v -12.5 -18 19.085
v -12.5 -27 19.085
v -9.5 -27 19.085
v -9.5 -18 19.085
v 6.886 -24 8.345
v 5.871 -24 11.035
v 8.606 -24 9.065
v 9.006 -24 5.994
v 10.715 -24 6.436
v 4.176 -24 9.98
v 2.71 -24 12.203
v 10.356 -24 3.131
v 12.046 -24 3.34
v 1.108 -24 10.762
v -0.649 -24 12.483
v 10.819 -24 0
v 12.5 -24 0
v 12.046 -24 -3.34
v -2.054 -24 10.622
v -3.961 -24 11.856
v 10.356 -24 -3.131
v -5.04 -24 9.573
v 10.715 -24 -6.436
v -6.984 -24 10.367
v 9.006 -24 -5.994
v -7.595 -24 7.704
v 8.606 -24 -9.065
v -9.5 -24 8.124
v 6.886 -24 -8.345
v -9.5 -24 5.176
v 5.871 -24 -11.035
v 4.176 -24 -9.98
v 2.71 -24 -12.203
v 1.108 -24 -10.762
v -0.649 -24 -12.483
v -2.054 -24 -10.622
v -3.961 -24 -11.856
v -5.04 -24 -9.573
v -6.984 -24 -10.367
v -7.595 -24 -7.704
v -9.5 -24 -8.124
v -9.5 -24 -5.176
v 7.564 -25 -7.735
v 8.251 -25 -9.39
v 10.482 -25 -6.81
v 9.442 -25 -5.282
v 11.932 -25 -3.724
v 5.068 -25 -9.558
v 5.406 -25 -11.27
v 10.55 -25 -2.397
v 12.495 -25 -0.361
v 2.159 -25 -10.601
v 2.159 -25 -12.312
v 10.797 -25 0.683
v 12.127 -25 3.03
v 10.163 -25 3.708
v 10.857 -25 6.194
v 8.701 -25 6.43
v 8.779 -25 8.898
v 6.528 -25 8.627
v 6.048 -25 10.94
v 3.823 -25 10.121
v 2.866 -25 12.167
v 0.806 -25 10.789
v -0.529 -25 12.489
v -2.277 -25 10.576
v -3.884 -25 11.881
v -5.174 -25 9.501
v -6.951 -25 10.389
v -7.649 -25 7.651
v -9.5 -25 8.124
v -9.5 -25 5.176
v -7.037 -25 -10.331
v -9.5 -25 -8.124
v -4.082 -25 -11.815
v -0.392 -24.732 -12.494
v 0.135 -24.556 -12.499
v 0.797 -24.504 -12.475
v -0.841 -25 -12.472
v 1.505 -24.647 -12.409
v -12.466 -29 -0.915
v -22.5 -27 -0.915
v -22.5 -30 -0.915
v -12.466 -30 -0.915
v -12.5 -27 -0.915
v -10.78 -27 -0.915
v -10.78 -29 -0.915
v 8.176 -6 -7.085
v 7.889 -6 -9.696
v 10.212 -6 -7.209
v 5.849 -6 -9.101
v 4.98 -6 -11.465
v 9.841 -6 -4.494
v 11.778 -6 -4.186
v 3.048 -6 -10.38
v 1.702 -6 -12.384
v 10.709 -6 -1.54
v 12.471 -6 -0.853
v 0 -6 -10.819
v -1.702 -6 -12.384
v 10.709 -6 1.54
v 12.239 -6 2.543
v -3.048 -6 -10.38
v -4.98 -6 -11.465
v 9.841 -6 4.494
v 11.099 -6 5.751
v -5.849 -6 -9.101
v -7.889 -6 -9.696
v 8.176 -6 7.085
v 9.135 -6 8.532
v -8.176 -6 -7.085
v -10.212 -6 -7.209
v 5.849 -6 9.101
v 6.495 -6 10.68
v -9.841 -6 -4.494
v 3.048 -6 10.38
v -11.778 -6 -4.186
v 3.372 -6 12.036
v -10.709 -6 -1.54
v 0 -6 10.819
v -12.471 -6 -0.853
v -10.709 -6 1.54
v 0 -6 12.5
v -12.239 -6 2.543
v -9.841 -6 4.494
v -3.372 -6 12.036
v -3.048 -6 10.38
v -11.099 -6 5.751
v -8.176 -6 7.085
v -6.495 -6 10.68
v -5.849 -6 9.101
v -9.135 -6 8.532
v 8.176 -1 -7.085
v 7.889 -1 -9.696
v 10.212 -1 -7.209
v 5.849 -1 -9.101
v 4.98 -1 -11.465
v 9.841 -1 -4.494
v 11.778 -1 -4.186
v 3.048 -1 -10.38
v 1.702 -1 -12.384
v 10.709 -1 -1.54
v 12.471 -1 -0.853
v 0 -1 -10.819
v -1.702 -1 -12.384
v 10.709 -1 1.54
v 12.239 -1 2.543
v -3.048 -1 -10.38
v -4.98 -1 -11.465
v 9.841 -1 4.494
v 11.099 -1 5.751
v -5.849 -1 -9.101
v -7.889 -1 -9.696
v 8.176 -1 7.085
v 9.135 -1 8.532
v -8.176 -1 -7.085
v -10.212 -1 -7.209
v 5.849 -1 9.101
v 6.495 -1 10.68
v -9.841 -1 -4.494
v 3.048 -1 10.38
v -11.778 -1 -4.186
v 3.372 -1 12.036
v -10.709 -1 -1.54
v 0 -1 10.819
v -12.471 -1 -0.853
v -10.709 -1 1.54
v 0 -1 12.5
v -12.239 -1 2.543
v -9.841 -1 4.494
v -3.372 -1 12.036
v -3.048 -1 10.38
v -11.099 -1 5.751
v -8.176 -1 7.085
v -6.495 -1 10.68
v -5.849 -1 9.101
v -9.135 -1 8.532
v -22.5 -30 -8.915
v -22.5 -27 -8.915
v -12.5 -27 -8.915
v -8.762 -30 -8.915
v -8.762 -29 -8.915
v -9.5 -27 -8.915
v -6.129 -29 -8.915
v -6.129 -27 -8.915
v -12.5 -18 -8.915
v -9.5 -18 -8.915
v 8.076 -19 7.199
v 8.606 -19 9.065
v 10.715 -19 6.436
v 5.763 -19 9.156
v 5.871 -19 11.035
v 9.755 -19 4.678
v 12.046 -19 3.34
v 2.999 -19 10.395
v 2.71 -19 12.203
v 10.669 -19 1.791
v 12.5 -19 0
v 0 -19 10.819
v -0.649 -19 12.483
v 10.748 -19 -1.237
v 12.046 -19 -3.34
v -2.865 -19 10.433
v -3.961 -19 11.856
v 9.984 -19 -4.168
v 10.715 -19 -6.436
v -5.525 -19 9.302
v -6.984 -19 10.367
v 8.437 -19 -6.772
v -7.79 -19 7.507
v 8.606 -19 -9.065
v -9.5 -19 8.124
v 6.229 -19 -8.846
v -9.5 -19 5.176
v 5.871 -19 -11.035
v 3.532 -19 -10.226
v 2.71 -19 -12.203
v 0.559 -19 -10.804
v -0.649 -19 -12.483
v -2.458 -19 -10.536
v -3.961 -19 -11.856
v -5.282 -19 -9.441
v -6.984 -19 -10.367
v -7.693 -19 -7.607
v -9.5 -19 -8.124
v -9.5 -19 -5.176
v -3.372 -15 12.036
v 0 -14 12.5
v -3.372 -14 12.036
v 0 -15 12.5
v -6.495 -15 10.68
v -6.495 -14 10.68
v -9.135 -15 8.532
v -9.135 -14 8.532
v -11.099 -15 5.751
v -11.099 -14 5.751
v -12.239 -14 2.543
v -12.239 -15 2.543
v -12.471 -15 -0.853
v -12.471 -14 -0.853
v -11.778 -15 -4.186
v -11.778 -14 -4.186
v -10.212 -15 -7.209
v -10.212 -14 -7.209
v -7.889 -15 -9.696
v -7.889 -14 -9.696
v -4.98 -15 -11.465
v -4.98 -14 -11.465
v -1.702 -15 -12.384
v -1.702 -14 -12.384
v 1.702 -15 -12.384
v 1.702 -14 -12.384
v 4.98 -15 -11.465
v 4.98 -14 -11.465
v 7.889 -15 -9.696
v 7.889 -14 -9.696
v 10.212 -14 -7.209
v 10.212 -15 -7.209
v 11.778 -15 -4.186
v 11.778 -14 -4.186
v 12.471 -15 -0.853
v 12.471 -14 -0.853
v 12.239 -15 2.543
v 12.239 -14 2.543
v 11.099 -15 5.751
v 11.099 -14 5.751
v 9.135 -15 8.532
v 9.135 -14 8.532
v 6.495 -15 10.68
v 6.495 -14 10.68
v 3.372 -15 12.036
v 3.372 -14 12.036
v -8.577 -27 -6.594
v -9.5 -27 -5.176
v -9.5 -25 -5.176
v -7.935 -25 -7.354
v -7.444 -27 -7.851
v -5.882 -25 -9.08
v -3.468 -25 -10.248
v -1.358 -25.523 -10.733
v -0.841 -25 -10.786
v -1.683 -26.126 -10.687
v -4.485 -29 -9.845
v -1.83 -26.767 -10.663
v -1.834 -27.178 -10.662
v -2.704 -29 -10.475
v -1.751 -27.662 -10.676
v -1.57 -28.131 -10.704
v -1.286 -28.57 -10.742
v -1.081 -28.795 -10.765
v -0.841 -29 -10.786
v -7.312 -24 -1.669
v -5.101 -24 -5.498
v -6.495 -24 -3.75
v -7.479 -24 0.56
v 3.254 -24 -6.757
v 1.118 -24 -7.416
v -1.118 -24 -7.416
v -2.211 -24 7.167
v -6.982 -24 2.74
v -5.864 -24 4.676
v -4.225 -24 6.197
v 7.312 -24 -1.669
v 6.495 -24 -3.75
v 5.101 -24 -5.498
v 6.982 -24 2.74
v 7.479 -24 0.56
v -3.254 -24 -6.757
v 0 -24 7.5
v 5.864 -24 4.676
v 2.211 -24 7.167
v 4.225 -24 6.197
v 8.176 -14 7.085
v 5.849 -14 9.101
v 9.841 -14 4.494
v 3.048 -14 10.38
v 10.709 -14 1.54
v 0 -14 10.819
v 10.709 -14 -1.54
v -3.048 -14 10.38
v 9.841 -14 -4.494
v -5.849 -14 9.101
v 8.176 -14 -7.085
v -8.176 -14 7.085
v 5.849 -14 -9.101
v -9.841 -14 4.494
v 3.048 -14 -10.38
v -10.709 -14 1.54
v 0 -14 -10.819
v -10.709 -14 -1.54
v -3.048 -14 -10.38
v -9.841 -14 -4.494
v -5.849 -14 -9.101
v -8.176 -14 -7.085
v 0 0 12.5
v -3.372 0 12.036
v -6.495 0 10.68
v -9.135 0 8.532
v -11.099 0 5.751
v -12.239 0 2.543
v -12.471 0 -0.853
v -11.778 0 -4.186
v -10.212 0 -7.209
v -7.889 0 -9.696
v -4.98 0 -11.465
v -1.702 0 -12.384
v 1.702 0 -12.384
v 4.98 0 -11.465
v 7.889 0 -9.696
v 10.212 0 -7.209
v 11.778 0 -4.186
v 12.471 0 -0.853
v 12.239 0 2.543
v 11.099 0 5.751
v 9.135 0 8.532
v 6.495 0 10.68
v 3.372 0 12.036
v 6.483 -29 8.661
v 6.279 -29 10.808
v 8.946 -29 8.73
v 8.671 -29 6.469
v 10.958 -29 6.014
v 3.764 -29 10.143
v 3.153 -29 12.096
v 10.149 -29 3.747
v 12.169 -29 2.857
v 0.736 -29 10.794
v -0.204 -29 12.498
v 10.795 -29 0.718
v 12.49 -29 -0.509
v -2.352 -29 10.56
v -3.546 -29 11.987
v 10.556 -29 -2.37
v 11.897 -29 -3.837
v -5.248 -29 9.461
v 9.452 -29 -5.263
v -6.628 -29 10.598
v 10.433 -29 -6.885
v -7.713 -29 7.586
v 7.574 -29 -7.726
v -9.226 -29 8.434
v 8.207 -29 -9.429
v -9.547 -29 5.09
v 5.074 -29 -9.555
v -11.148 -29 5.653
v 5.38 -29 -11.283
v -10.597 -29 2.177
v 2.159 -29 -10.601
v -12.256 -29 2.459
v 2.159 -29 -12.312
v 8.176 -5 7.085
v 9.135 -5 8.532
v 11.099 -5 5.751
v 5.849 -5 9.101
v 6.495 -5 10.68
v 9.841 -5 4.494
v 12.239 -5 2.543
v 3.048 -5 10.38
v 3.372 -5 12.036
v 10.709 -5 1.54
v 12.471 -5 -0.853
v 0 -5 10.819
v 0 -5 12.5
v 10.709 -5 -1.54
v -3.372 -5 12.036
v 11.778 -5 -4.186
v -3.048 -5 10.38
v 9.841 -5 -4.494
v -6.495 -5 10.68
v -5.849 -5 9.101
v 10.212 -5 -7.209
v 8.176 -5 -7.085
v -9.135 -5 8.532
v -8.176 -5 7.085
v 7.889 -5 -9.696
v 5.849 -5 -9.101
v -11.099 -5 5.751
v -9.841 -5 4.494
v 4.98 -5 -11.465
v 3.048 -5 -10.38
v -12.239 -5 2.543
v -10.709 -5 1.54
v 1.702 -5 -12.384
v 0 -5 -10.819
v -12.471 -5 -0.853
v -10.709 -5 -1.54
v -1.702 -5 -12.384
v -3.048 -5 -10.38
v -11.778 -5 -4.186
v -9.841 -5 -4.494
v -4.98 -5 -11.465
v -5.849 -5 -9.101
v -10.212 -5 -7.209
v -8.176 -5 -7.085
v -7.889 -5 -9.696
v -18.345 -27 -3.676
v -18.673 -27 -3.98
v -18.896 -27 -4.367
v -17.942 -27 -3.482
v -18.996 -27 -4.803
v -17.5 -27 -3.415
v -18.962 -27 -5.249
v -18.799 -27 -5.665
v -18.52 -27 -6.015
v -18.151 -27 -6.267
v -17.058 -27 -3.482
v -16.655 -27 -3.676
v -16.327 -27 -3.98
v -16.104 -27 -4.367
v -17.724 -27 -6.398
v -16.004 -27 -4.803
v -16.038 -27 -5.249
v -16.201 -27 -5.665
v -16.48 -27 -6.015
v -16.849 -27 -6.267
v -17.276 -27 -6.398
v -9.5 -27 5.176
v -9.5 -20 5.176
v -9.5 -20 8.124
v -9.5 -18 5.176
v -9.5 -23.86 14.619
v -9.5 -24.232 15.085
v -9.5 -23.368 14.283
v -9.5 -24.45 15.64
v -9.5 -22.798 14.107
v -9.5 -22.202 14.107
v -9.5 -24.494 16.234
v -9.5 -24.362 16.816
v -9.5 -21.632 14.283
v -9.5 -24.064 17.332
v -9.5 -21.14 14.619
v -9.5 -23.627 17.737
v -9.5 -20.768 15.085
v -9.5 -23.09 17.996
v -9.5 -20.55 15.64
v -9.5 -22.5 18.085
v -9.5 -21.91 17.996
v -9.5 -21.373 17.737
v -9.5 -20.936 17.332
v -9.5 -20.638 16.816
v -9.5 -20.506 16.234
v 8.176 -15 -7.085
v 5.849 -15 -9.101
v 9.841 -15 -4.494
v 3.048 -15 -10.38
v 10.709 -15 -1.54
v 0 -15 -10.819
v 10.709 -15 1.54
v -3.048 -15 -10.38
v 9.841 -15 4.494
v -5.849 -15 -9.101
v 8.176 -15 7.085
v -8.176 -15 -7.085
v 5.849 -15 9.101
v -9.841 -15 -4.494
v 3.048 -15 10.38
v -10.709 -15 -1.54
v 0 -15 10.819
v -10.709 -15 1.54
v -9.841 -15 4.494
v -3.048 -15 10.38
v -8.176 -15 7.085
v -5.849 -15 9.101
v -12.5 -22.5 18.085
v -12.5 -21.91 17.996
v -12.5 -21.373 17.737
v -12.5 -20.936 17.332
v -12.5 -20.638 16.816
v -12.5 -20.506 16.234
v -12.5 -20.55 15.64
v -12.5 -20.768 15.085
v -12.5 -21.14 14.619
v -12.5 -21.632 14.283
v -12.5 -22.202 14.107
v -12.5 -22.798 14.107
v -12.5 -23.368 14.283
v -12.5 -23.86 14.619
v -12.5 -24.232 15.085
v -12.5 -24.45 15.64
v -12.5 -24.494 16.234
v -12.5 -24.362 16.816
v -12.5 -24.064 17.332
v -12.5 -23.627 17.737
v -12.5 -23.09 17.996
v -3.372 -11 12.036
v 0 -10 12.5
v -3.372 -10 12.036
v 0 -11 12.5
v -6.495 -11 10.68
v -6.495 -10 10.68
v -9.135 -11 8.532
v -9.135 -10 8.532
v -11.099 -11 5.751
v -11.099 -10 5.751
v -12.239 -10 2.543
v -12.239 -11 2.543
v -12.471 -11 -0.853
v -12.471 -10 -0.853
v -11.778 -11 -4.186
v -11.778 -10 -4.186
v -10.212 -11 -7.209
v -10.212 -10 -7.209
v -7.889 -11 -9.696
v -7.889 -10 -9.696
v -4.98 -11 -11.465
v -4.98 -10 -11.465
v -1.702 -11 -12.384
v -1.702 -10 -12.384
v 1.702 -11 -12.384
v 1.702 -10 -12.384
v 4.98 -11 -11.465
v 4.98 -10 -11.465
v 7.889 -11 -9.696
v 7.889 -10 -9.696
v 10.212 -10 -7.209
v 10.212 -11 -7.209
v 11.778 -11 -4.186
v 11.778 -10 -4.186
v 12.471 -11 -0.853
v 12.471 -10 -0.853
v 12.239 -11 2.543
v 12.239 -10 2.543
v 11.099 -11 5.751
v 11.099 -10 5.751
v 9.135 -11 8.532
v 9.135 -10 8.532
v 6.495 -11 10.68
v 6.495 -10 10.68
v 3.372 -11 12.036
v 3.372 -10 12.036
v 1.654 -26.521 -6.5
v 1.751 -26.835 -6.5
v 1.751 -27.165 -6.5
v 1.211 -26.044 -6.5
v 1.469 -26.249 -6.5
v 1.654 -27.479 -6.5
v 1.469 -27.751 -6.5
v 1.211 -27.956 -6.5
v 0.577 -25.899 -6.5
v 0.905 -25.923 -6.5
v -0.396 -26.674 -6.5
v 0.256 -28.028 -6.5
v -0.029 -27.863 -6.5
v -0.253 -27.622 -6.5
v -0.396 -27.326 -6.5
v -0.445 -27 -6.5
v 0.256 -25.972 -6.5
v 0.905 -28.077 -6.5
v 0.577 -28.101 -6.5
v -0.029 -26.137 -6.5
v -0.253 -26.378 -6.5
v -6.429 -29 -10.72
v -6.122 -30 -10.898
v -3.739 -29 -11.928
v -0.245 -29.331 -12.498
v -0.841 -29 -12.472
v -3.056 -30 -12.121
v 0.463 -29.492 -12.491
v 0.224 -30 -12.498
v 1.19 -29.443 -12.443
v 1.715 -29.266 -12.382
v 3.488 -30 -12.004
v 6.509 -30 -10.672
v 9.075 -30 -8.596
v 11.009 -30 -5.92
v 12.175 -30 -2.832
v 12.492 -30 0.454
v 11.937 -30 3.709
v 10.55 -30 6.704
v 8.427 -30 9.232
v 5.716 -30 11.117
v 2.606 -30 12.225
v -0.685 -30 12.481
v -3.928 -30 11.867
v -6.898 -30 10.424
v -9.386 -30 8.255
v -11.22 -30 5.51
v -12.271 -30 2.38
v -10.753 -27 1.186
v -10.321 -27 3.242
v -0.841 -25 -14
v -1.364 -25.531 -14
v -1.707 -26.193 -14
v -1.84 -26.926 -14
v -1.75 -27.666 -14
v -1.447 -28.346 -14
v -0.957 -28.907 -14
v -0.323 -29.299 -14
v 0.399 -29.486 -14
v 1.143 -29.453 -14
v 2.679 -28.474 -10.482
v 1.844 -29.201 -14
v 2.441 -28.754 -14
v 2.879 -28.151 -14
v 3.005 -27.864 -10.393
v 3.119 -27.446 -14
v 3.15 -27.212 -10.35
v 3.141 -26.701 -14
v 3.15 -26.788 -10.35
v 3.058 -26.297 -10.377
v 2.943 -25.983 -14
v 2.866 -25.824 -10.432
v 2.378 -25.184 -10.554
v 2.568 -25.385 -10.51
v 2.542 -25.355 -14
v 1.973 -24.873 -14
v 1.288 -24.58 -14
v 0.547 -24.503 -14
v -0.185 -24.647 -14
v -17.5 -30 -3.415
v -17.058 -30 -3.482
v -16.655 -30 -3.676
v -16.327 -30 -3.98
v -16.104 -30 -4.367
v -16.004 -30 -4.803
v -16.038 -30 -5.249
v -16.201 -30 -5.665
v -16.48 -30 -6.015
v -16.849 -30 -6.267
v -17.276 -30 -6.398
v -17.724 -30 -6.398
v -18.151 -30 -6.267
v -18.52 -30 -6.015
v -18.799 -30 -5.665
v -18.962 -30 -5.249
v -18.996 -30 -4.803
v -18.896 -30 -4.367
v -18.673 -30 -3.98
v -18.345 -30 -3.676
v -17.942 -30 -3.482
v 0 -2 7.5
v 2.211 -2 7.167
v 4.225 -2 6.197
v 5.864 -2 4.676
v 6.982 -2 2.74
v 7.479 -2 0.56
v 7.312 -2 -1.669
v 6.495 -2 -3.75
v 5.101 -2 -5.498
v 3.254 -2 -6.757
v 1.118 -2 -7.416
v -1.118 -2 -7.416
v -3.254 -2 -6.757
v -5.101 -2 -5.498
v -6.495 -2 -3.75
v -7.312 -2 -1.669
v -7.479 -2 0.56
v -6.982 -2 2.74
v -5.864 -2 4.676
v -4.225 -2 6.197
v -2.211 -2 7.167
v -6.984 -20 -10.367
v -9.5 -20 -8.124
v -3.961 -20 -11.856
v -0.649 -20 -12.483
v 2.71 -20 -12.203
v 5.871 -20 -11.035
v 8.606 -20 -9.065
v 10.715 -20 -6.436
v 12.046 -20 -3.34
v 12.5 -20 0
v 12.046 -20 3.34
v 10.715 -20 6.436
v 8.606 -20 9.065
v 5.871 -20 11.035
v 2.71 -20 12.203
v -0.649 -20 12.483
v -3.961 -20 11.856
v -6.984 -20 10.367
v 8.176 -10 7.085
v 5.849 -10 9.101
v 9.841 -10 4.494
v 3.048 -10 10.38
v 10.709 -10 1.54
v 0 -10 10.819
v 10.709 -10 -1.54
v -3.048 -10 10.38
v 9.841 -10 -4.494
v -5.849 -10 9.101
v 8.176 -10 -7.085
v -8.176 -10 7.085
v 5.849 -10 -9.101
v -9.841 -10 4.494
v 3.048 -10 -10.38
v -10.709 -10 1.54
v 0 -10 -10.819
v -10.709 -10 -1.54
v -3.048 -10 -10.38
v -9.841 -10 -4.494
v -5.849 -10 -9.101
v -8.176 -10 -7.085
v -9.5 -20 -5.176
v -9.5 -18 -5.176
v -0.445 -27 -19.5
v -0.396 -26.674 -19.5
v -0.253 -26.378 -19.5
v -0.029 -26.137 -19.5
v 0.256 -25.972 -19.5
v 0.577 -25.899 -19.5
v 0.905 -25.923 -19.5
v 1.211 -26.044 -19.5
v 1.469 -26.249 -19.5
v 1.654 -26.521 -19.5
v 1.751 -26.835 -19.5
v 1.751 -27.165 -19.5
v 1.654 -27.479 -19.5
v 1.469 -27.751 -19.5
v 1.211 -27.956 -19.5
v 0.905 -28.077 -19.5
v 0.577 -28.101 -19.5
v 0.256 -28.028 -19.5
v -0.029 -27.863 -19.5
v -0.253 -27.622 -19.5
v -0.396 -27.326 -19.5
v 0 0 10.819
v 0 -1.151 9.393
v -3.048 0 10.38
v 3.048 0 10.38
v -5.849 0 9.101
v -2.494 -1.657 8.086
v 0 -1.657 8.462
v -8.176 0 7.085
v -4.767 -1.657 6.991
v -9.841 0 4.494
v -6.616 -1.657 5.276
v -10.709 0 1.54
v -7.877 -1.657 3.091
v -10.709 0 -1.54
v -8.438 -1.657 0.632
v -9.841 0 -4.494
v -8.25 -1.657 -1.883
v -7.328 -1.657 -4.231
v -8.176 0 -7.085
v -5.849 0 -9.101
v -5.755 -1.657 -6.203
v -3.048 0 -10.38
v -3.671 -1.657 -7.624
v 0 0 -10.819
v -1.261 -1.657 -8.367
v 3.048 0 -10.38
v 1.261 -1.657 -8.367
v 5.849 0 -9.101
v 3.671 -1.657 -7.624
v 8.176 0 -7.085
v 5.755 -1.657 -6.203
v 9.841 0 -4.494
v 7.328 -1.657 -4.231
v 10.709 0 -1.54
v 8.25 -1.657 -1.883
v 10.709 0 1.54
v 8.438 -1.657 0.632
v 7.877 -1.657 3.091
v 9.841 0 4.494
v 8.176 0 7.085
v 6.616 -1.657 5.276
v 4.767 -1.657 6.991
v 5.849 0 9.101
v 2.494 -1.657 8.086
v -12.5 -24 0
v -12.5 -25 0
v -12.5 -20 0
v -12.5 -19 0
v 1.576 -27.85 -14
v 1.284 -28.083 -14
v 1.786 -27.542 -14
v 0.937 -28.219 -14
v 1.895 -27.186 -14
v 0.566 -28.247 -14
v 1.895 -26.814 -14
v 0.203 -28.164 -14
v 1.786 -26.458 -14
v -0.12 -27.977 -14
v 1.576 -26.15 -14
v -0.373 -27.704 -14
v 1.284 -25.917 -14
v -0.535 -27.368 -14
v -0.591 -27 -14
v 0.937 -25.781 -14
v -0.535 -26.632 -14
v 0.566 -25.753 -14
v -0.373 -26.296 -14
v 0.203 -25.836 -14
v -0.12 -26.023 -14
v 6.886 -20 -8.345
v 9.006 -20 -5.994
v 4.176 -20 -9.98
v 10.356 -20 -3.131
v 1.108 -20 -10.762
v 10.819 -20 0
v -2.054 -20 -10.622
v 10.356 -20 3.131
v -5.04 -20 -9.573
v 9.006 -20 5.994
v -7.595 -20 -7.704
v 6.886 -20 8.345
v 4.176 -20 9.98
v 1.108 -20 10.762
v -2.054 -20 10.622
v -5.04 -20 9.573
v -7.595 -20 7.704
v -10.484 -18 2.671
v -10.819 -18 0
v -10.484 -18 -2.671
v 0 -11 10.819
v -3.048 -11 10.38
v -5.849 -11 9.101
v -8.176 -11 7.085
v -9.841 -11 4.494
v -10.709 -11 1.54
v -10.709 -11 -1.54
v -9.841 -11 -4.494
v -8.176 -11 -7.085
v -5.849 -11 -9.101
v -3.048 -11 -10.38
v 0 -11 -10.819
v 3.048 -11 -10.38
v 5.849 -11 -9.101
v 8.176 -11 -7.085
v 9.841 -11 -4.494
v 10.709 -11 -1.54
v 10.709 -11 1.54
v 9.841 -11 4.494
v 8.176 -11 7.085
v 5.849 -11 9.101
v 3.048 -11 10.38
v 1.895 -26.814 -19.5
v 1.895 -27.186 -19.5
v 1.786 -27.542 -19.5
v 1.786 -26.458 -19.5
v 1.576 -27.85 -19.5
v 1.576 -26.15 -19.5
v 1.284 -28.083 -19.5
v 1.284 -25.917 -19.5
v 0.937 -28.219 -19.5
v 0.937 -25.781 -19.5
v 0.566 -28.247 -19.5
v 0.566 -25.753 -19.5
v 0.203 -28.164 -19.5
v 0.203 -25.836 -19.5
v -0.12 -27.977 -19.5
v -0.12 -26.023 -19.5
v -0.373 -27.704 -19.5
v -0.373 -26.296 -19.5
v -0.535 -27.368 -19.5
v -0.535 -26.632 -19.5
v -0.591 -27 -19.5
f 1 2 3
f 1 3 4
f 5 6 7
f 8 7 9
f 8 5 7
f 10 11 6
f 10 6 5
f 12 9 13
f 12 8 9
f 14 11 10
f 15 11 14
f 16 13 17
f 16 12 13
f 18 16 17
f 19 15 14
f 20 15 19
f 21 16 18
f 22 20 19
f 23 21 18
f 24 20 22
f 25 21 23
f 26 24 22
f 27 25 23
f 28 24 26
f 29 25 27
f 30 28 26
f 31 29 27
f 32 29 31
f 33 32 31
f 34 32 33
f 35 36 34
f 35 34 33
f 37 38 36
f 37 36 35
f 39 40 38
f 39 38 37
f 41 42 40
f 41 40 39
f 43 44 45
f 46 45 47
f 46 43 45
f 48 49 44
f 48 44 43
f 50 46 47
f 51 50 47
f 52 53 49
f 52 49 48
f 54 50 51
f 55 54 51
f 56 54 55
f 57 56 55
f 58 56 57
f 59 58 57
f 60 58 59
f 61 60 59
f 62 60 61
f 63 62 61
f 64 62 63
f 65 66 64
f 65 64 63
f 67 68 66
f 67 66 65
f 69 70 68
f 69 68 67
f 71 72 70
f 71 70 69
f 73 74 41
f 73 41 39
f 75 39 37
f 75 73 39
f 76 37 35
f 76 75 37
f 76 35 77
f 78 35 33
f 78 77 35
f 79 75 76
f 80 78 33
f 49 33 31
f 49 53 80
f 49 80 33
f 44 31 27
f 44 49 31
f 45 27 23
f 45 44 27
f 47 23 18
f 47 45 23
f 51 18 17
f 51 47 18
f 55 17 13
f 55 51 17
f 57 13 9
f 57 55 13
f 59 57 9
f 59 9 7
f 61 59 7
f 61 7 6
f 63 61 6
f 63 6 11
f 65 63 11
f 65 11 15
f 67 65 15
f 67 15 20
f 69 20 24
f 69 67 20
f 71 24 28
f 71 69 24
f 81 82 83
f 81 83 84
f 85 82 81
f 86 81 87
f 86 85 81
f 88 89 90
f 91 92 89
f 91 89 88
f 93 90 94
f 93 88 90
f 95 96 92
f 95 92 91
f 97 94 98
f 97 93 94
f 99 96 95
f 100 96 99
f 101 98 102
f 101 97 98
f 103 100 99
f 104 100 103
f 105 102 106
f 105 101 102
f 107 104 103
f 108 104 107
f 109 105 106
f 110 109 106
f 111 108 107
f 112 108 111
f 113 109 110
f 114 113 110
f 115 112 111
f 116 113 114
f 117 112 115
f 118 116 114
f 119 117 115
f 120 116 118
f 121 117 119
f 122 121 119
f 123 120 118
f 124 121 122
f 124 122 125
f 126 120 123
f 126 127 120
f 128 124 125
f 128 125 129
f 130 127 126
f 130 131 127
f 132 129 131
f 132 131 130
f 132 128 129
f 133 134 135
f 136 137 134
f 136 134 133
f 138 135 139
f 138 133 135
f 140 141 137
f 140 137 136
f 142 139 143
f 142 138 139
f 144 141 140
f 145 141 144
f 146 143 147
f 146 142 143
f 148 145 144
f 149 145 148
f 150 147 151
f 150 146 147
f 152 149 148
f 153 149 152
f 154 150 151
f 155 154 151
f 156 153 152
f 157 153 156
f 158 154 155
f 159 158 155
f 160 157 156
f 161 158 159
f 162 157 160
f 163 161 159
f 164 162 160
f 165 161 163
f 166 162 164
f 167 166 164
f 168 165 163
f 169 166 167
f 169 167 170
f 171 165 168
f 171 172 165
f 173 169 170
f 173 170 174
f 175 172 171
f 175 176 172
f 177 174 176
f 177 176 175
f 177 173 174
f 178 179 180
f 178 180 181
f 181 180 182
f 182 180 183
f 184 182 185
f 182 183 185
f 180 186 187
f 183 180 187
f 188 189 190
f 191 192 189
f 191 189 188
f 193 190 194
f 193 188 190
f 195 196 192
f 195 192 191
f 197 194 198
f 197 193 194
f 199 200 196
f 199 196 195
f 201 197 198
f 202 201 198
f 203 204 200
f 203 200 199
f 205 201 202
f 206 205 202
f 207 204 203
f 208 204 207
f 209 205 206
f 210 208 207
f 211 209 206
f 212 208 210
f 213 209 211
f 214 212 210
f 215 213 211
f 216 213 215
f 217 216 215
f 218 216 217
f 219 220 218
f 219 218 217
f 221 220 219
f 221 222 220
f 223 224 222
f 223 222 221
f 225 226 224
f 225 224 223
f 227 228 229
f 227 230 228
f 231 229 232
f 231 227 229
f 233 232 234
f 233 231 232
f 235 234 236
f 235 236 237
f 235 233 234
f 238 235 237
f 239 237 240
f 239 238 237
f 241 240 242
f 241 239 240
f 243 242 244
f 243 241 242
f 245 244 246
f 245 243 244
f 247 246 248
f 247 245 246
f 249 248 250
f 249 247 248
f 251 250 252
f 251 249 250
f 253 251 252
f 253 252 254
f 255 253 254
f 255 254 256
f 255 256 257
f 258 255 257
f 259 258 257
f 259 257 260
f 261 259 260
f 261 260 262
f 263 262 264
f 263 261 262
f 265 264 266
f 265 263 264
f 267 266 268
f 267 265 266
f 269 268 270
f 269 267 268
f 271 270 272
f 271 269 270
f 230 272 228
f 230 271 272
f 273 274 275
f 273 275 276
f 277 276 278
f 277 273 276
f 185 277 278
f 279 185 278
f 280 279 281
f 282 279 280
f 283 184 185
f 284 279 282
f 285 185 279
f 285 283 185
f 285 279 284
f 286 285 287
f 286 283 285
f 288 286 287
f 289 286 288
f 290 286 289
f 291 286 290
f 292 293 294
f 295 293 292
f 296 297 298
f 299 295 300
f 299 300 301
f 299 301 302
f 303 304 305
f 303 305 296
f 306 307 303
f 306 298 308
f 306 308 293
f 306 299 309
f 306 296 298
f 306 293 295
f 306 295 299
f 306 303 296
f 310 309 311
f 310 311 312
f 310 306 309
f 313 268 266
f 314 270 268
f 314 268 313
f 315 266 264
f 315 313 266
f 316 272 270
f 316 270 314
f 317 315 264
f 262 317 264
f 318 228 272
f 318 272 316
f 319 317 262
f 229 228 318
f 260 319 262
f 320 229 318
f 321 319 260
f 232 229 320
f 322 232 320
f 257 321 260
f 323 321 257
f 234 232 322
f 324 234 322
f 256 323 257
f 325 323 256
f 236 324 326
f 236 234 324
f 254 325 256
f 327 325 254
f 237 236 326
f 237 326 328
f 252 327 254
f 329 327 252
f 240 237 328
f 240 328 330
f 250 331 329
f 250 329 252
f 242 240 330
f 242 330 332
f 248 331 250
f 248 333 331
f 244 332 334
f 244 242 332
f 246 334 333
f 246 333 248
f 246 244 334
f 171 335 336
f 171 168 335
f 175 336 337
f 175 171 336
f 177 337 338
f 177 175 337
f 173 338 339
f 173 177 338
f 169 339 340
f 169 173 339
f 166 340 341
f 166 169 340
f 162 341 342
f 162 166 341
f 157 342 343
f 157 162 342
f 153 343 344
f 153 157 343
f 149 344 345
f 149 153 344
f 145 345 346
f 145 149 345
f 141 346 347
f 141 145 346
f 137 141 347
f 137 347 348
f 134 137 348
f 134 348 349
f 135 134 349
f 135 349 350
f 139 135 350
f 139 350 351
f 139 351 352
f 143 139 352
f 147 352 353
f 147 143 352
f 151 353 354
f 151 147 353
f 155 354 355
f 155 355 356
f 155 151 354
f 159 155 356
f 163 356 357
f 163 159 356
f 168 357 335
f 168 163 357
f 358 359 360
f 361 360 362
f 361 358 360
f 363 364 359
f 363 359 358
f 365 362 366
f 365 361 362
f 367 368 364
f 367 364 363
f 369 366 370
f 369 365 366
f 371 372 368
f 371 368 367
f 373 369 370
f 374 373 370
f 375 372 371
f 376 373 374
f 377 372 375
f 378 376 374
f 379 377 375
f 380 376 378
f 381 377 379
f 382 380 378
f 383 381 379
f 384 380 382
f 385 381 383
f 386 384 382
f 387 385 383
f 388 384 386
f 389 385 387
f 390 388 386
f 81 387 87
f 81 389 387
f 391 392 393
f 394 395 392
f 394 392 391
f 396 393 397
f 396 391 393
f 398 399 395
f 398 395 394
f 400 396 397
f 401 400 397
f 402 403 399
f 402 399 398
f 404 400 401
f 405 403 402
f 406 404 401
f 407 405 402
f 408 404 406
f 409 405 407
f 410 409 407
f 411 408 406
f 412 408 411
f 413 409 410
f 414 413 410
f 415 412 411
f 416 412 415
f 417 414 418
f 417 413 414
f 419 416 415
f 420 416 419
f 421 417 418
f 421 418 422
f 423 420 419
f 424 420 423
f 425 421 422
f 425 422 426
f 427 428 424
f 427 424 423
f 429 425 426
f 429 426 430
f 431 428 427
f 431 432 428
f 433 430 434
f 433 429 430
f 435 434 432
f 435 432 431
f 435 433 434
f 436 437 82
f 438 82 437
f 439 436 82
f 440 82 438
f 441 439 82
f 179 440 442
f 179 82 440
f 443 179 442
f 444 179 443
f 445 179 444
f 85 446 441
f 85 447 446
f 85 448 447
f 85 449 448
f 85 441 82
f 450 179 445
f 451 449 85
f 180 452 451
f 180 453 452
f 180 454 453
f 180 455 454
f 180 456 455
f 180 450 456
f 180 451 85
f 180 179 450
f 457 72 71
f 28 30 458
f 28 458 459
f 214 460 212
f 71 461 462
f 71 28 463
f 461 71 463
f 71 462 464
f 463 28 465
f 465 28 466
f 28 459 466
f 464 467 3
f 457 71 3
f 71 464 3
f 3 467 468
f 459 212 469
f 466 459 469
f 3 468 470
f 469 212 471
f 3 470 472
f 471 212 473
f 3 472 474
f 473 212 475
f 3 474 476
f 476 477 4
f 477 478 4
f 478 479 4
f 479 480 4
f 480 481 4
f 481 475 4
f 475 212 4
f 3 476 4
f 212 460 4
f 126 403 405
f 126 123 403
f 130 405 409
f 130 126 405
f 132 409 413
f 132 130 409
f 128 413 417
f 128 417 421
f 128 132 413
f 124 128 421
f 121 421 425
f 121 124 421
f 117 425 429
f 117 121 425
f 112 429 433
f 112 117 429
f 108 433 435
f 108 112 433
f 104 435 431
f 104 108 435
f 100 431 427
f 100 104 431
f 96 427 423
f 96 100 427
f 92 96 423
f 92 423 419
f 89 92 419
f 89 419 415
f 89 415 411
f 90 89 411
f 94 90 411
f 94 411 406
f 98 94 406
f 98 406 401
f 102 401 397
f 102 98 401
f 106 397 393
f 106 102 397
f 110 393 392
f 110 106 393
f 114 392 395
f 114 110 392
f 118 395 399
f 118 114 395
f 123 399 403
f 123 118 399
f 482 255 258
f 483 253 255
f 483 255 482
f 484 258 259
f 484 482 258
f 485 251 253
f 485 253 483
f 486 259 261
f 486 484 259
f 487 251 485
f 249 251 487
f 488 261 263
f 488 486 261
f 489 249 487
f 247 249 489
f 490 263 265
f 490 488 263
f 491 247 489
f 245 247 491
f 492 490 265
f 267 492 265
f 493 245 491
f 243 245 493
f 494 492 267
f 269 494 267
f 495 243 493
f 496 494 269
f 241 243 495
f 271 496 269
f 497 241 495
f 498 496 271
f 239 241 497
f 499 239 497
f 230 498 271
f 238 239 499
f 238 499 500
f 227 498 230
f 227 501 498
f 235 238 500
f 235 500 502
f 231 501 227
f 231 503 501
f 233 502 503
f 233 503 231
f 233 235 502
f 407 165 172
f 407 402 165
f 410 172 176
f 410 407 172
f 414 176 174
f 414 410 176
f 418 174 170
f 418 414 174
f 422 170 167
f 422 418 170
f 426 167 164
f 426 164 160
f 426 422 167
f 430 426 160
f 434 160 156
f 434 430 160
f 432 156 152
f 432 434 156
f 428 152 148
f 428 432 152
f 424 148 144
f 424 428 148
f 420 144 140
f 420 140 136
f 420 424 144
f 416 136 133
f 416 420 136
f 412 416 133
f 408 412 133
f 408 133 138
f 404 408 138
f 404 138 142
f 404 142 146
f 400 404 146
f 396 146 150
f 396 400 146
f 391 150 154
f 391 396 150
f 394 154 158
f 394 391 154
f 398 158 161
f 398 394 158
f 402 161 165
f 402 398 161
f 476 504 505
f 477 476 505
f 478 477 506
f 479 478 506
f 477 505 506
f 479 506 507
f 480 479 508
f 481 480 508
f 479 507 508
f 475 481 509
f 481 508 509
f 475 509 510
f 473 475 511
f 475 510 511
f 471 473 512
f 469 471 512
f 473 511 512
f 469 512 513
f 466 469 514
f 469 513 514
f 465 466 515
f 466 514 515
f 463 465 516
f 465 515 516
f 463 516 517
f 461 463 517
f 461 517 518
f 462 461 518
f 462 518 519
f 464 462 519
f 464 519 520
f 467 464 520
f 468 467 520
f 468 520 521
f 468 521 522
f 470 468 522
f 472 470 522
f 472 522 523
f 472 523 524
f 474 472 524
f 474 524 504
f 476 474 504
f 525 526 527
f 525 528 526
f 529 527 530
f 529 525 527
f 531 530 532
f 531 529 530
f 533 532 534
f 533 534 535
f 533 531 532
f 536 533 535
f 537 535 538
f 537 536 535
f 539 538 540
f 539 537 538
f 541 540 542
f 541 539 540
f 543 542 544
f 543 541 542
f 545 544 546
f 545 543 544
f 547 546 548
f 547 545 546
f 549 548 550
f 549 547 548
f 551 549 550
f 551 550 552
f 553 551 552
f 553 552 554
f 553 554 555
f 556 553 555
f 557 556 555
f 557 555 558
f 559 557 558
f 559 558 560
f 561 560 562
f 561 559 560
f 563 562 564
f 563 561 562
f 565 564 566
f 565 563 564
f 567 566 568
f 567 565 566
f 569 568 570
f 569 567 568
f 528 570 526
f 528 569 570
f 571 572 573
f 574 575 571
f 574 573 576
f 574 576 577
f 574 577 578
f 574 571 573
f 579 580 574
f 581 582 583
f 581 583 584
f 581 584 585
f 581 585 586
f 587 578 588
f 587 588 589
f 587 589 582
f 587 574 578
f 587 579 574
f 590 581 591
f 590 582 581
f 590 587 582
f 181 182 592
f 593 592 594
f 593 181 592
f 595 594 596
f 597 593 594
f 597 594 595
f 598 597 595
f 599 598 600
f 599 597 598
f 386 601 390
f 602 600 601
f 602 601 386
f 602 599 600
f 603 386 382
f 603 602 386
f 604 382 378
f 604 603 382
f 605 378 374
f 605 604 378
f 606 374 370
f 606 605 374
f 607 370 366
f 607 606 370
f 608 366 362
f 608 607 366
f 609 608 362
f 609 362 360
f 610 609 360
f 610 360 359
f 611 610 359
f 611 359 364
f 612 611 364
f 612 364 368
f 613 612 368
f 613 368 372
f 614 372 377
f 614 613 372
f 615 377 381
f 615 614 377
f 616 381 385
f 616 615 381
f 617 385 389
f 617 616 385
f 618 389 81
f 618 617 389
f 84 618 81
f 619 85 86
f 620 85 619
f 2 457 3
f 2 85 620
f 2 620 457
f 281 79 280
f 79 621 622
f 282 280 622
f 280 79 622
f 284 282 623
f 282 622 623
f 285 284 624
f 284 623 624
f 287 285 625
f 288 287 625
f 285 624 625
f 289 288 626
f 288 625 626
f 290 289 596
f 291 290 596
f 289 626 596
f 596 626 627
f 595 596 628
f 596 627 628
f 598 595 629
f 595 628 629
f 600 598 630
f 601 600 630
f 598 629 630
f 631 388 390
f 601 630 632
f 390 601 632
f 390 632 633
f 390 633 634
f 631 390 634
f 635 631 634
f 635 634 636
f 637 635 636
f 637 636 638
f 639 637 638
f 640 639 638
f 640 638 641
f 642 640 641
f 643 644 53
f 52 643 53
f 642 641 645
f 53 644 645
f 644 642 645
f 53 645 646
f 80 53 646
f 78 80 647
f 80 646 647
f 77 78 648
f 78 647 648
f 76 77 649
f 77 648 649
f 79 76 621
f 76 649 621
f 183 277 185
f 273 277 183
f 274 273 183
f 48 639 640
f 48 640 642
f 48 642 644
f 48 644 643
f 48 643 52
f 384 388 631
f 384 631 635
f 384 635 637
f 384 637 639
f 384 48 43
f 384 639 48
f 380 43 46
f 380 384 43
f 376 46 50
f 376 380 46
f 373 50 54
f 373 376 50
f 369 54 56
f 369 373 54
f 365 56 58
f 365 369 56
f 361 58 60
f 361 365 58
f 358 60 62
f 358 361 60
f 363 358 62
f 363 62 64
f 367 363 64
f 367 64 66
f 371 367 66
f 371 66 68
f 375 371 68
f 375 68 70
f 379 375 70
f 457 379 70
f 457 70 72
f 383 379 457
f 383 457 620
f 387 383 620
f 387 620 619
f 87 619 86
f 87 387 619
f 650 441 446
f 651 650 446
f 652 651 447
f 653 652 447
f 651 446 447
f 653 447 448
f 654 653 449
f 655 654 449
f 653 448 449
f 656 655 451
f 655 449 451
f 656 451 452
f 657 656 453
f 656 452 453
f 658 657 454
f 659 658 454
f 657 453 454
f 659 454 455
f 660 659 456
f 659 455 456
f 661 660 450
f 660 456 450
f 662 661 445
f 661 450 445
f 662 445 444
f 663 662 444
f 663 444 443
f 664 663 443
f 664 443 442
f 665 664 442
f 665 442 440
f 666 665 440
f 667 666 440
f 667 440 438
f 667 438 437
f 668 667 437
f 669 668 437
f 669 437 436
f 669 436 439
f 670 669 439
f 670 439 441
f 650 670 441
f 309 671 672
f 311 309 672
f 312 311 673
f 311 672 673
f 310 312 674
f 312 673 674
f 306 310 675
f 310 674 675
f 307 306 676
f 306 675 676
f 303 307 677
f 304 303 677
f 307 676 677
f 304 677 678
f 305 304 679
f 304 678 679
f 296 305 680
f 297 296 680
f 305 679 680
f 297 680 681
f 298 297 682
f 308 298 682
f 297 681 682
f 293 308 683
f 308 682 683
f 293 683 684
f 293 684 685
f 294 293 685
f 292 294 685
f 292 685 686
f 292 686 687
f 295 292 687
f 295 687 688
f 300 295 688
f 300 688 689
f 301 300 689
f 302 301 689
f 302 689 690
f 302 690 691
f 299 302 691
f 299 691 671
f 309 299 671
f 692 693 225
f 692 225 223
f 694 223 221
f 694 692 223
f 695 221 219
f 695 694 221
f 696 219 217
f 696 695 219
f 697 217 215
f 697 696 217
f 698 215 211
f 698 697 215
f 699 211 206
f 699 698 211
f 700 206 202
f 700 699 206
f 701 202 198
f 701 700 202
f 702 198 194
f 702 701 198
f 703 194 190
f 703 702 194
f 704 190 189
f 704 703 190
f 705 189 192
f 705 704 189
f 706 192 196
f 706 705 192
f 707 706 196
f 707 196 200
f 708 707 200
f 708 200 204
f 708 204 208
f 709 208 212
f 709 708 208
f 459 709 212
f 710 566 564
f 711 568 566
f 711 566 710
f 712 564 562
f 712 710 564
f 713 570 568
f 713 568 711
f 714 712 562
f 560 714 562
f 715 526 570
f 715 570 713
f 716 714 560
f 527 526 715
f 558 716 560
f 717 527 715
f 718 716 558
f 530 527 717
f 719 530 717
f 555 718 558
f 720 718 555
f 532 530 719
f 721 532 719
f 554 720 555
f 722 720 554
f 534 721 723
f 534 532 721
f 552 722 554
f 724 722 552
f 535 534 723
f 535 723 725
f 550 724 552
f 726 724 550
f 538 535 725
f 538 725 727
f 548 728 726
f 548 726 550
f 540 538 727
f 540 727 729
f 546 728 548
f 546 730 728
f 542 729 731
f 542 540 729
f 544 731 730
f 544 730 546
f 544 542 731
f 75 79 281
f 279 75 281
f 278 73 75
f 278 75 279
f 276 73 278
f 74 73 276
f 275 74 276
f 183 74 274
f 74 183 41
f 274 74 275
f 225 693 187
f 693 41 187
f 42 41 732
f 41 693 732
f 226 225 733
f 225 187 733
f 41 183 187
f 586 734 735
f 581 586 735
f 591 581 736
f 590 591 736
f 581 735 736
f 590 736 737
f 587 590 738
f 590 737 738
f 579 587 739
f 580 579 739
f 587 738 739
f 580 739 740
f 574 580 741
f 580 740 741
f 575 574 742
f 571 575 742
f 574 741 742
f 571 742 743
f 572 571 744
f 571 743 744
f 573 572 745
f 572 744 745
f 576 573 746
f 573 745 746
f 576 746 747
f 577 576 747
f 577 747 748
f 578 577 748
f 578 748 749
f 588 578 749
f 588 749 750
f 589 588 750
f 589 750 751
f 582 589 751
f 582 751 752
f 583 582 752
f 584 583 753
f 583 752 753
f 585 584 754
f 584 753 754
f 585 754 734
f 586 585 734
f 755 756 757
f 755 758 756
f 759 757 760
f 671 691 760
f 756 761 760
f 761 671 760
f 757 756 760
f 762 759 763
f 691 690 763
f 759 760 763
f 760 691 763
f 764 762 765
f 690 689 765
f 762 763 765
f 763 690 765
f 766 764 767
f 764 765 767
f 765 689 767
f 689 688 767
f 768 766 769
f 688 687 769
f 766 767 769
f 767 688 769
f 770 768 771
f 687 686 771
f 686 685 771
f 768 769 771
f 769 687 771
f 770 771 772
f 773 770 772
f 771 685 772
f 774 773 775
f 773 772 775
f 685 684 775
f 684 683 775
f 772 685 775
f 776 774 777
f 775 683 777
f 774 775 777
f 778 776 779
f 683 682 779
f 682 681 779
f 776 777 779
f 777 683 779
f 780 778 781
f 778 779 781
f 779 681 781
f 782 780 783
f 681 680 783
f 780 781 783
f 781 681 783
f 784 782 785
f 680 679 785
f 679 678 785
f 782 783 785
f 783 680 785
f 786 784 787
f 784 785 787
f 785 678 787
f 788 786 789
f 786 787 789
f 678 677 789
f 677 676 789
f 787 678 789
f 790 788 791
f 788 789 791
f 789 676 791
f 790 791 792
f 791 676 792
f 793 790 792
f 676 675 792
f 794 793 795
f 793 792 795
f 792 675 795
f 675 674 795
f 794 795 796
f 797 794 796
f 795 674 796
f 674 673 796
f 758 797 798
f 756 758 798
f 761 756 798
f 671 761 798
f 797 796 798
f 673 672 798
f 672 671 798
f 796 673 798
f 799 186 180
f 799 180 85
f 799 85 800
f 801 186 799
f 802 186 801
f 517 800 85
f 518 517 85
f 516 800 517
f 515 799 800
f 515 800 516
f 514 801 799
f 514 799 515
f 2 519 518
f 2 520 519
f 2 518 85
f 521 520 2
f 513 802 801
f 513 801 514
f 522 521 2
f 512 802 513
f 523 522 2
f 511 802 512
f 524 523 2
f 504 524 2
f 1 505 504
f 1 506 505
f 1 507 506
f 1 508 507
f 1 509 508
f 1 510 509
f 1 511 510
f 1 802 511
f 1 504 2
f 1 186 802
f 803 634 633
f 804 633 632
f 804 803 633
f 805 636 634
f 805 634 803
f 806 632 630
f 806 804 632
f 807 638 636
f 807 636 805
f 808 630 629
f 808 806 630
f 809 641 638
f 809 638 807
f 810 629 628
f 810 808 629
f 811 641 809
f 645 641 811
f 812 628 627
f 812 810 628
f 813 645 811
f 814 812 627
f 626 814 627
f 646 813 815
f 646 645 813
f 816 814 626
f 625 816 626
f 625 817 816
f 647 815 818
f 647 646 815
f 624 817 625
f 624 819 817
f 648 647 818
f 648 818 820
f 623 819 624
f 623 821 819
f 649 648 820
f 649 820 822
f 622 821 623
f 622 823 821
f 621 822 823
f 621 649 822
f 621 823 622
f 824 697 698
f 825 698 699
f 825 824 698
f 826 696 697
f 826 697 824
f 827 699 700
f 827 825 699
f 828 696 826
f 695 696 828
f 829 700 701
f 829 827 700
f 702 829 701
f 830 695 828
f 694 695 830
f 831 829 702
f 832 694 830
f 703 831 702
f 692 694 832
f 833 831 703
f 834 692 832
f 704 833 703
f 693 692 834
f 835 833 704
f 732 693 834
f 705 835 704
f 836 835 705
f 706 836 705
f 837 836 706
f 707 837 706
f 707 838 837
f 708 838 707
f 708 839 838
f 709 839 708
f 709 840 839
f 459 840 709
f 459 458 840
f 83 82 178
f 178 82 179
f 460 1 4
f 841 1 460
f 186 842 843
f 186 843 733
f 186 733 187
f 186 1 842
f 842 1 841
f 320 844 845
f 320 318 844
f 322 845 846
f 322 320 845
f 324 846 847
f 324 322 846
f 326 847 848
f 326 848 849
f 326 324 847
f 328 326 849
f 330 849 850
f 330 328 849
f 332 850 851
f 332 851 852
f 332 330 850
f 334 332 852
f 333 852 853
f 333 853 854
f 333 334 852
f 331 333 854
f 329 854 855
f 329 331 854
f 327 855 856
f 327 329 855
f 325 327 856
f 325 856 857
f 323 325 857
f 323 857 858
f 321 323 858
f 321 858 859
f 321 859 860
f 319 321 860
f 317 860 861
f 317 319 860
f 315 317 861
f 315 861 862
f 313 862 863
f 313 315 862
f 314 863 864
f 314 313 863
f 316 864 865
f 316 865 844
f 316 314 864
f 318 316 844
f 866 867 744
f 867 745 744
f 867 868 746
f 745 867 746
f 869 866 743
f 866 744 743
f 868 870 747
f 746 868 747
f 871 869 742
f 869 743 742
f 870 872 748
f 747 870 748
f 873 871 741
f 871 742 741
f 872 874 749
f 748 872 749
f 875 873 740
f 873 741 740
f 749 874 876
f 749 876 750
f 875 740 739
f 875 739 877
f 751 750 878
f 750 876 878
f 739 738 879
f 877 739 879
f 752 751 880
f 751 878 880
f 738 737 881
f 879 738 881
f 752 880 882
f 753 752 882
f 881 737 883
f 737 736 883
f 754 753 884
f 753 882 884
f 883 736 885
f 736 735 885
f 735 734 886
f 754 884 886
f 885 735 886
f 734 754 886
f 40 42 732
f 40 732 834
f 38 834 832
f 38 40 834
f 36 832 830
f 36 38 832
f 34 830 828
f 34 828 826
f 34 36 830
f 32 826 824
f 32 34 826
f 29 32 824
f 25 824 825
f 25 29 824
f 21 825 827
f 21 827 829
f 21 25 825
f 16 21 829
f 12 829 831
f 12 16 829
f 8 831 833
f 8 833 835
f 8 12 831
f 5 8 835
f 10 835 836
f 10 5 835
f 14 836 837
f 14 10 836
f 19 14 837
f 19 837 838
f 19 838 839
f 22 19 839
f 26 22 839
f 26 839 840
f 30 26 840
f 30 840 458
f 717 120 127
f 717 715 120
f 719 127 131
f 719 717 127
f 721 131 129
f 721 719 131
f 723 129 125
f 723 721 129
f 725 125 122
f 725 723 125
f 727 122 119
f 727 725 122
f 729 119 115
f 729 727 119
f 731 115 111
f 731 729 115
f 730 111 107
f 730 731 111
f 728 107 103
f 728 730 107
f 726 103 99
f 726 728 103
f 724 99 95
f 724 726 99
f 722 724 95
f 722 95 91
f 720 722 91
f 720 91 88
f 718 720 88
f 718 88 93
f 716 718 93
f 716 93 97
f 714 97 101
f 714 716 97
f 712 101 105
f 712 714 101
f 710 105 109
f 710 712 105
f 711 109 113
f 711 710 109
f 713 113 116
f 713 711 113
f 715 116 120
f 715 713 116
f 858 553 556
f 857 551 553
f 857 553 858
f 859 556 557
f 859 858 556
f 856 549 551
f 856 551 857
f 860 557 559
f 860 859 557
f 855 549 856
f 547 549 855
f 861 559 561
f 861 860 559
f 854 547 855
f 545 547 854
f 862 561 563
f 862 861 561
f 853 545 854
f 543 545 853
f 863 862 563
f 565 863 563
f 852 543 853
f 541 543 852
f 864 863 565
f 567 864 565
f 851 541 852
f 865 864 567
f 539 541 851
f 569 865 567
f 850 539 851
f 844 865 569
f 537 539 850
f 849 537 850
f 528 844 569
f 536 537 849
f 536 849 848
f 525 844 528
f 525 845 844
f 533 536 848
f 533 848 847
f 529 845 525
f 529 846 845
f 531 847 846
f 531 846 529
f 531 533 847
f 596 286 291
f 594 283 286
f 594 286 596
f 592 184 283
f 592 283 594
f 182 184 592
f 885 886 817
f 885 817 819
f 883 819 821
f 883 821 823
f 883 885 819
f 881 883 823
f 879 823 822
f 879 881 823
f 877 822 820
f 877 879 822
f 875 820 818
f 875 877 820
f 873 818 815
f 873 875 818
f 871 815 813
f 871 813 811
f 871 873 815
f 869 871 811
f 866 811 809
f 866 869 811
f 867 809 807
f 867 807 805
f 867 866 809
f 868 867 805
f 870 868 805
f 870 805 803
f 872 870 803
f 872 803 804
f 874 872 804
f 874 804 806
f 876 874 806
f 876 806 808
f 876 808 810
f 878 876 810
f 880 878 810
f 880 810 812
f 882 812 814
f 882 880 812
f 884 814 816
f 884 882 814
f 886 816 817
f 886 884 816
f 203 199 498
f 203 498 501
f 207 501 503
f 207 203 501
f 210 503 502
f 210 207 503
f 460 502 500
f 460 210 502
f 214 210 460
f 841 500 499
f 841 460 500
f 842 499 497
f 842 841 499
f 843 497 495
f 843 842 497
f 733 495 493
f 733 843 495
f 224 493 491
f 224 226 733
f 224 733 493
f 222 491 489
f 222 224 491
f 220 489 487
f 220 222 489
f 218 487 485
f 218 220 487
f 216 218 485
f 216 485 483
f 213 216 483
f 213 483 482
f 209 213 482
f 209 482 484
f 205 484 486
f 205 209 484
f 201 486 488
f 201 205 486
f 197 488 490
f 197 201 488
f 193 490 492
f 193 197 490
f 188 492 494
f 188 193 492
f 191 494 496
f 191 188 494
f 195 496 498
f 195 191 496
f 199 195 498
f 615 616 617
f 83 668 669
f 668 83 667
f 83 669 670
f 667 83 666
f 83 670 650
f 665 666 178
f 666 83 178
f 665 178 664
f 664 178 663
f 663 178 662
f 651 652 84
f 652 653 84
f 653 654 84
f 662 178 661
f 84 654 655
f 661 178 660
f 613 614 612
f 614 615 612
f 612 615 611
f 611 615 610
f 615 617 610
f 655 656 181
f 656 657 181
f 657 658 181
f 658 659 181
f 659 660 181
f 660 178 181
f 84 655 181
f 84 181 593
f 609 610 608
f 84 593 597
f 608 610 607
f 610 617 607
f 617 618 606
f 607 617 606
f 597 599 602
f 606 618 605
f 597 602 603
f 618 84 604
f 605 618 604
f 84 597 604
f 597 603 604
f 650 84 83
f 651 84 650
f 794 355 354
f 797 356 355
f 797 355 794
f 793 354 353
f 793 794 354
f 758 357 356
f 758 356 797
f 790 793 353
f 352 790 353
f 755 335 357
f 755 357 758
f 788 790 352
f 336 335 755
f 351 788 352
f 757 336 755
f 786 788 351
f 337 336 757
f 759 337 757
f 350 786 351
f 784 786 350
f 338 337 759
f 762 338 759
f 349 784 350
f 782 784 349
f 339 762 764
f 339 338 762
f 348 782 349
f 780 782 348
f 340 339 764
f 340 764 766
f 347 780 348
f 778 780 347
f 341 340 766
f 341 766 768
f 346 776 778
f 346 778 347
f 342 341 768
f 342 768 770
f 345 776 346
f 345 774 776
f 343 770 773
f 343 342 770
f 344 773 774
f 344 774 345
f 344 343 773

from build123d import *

# Parameters (mm, degrees)
CROQUIS2_R              = 7.5
CORTAR_EXTRUIR1_DEPTH   = 24
SALIENTE_EXTRUIR1_DEPTH = 3
SALIENTE_EXTRUIR2_DEPTH = 3
CROQUIS7_R              = 1.5
CORTAR_EXTRUIR3_DEPTH   = 13
CROQUIS8_R              = 1.5
CORTAR_EXTRUIR4_DEPTH   = 13
CROQUIS9_R              = 2.5
SALIENTE_EXTRUIR3_DEPTH = 13
CROQUIS10_R             = 1.104312036
CORTAR_EXTRUIR5_DEPTH   = 13
CROQUIS13_R             = 2.5
CROQUIS13_R_2           = 1.25
CORTAR_EXTRUIR6_DEPTH   = 5.5
CROQUIS15_W             = 10
CROQUIS15_H             = 8
SALIENTE_EXTRUIR4_DEPTH = 3
CROQUIS16_R             = 1.5
CORTAR_EXTRUIR7_DEPTH   = 30
CROQUIS17_R             = 1.5
SALIENTE_EXTRUIR5_DEPTH = 3
CROQUIS18_W             = 2
CROQUIS18_H             = 9
CORTAR_EXTRUIR11_DEPTH  = 3
CROQUIS19_R             = 2
CORTAR_EXTRUIR12_DEPTH  = 33


with BuildPart() as part:
    # Croquis1 → Revolución1 (revolve)
    with BuildSketch(Plane.XY, mode=Mode.PRIVATE) as revoluci_n1_sk:
        with BuildLine():
            Line((-10.818667505, 0), (-12.5, 0))
            Line((-12.5, 0), (-12.5, -1))
            Line((-12.5, -1), (-10.818667505, -1))
            Line((-10.818667505, -1), (-10.818667505, -5))
            Line((-10.818667505, -5), (-12.5, -5))
            Line((-12.5, -5), (-12.5, -6))
            Line((-12.5, -6), (-10.818667505, -6))
            Line((-10.818667505, -6), (-10.818667505, -10))
            Line((-10.818667505, -10), (-12.5, -10))
            Line((-12.5, -10), (-12.5, -11))
            Line((-12.5, -11), (-10.818667505, -11))
            Line((-10.818667505, -11), (-10.818667505, -14))
            Line((-10.818667505, -14), (-12.5, -14))
            Line((-12.5, -14), (-12.5, -15))
            Line((-12.5, -15), (-10.818667505, -15))
            Line((-10.818667505, -15), (-10.818667505, -19))
            Line((-10.818667505, -19), (-12.5, -19))
            Line((-12.5, -19), (-12.5, -20))
            Line((-12.5, -20), (-10.818667505, -20))
            Line((-10.818667505, -20), (-10.818667505, -24))
            Line((-10.818667505, -24), (-12.5, -24))
            Line((-12.5, -24), (-12.5, -25))
            Line((-12.5, -25), (-10.818667505, -25))
            Line((-10.818667505, -25), (-10.818667505, -29))
            Line((-10.818667505, -29), (-12.5, -29))
            Line((-12.5, -29), (-12.5, -30))
            Line((-12.5, -30), (0, -30))
            Line((0, -30), (0, -2))
            Line((0, -2), (-7.5, -2))
            add(Edge.make_bspline(
                [(-10.818667505, 0), (-9.258756579, -1.530453888), (-7.5, -2)],
                knots=[0, 0, 0, 0.398472736, 0.398472736, 0.398472736], degree=2))
        make_face()
    revolve(revoluci_n1_sk.sketch.rotate(Axis((0, -2, 0), (0, -1, 0)), 270), axis=Axis((0, -2, 0), (0, -1, 0)))

    # Croquis2 → Cortar-Extruir1 (cut)
    with BuildSketch(Plane(origin=(0, 0, 0), x_dir=(1, 0, 0), z_dir=(0, 1, 0))):
        with Locations(Location((0, 0, 0), (0, 0, 270))):
            Circle(CROQUIS2_R)
    extrude(amount=-CORTAR_EXTRUIR1_DEPTH, mode=Mode.SUBTRACT)

    # Croquis4 → Saliente-Extruir1 (add)
    with BuildSketch(Plane.ZY.offset(12.5)):
        Polygon((-8.915161304, -27), (10.818667505, -27), (21.084838696, -27), (21.084838696, -18), (-8.915161304, -18), align=None)
    extrude(amount=-SALIENTE_EXTRUIR1_DEPTH)

    # Croquis6 → Saliente-Extruir2 (add)
    with BuildSketch(Plane.XZ.offset(30)):
        Polygon((-12.5, -8.915161304), (-21.5, -8.915161304), (-21.5, -0.915161304), (-12.5, -0.915161304), (-4.999981801, -0.915161304), (-4.999981801, -8.915161304), align=None)
    extrude(amount=-SALIENTE_EXTRUIR2_DEPTH)

    # Croquis7 → Cortar-Extruir3 (cut)
    with BuildSketch(Plane.XZ.offset(30)):
        with Locations(Location((-18, -4.915161304, 0), (0, 0, 270))):
            Circle(CROQUIS7_R)
    extrude(amount=-CORTAR_EXTRUIR3_DEPTH, mode=Mode.SUBTRACT)

    # Croquis8 → Cortar-Extruir4 (cut)
    with BuildSketch(Plane.ZY.offset(12.5)):
        with Locations((17.584838696, -22.5)):
            Circle(CROQUIS8_R)
    extrude(amount=-CORTAR_EXTRUIR4_DEPTH, mode=Mode.SUBTRACT)

    # Croquis9 → Saliente-Extruir3 (add)
    with BuildSketch(Plane.XY.offset(-19.5)):
        with Locations(Location((0.659333752, -27, 0), (0, 0, 126.869897752))):
            Circle(CROQUIS9_R)
    extrude(amount=SALIENTE_EXTRUIR3_DEPTH)

    # Croquis10 → Cortar-Extruir5 (cut)
    with BuildSketch(Plane(origin=(0, 0, -19.5), x_dir=(-1, 0, 0), z_dir=(0, 0, -1))):
        with Locations((-0.659333752, -27)):
            Circle(CROQUIS10_R)
    extrude(amount=-CORTAR_EXTRUIR5_DEPTH, mode=Mode.SUBTRACT)

    # Croquis13 → Cortar-Extruir6 (cut)
    with BuildSketch(Plane(origin=(0, 0, -19.5), x_dir=(-1, 0, 0), z_dir=(0, 0, -1))):
        with Locations((-0.659333752, -27)):
            Circle(CROQUIS13_R)
        with Locations((-0.659333752, -27)):
            Circle(CROQUIS13_R_2, mode=Mode.SUBTRACT)
    extrude(amount=-CORTAR_EXTRUIR6_DEPTH, mode=Mode.SUBTRACT)

    # Croquis15 → Saliente-Extruir4 (add)
    with BuildSketch(Plane(origin=(0, -27, 0), x_dir=(1, 0, 0), z_dir=(0, 1, 0))):
        with Locations((-17.5, 4.915161304)):
            Rectangle(CROQUIS15_W, CROQUIS15_H)
    extrude(amount=-SALIENTE_EXTRUIR4_DEPTH)

    # Croquis16 → Cortar-Extruir7 (cut)
    with BuildSketch(Plane(origin=(0, -27, 0), x_dir=(1, 0, 0), z_dir=(0, 1, 0))):
        with Locations(Location((-17.5, 4.915161304, 0), (0, 0, 270))):
            Circle(CROQUIS16_R)
    extrude(amount=-CORTAR_EXTRUIR7_DEPTH, mode=Mode.SUBTRACT)

    # Croquis17 → Saliente-Extruir5 (add)
    with BuildSketch(Plane.ZY.offset(12.5)):
        Polygon((19.084838696, -18), (-8.915161304, -18), (-8.915161304, -27), (-0.915161304, -27), (19.084838696, -27), (19.084838696, -22.5), align=None)
        with Locations((17.584838696, -22.5)):
            Circle(CROQUIS17_R, mode=Mode.SUBTRACT)
        with Locations((17.584838696, -22.5)):
            Circle(CROQUIS17_R)
    extrude(amount=-SALIENTE_EXTRUIR5_DEPTH)

    # Croquis18 → Cortar-Extruir11 (cut)
    with BuildSketch(Plane.ZY.offset(12.5)):
        with Locations((20.084838696, -22.5)):
            Rectangle(CROQUIS18_W, CROQUIS18_H)
    extrude(amount=-CORTAR_EXTRUIR11_DEPTH, mode=Mode.SUBTRACT)

    # Croquis19 → Cortar-Extruir12 (cut)
    with BuildSketch(Plane.ZY.offset(12.5)):
        with Locations((16.084838696, -22.5)):
            Circle(CROQUIS19_R)
    extrude(amount=-CORTAR_EXTRUIR12_DEPTH, mode=Mode.SUBTRACT)


solid = part.part
